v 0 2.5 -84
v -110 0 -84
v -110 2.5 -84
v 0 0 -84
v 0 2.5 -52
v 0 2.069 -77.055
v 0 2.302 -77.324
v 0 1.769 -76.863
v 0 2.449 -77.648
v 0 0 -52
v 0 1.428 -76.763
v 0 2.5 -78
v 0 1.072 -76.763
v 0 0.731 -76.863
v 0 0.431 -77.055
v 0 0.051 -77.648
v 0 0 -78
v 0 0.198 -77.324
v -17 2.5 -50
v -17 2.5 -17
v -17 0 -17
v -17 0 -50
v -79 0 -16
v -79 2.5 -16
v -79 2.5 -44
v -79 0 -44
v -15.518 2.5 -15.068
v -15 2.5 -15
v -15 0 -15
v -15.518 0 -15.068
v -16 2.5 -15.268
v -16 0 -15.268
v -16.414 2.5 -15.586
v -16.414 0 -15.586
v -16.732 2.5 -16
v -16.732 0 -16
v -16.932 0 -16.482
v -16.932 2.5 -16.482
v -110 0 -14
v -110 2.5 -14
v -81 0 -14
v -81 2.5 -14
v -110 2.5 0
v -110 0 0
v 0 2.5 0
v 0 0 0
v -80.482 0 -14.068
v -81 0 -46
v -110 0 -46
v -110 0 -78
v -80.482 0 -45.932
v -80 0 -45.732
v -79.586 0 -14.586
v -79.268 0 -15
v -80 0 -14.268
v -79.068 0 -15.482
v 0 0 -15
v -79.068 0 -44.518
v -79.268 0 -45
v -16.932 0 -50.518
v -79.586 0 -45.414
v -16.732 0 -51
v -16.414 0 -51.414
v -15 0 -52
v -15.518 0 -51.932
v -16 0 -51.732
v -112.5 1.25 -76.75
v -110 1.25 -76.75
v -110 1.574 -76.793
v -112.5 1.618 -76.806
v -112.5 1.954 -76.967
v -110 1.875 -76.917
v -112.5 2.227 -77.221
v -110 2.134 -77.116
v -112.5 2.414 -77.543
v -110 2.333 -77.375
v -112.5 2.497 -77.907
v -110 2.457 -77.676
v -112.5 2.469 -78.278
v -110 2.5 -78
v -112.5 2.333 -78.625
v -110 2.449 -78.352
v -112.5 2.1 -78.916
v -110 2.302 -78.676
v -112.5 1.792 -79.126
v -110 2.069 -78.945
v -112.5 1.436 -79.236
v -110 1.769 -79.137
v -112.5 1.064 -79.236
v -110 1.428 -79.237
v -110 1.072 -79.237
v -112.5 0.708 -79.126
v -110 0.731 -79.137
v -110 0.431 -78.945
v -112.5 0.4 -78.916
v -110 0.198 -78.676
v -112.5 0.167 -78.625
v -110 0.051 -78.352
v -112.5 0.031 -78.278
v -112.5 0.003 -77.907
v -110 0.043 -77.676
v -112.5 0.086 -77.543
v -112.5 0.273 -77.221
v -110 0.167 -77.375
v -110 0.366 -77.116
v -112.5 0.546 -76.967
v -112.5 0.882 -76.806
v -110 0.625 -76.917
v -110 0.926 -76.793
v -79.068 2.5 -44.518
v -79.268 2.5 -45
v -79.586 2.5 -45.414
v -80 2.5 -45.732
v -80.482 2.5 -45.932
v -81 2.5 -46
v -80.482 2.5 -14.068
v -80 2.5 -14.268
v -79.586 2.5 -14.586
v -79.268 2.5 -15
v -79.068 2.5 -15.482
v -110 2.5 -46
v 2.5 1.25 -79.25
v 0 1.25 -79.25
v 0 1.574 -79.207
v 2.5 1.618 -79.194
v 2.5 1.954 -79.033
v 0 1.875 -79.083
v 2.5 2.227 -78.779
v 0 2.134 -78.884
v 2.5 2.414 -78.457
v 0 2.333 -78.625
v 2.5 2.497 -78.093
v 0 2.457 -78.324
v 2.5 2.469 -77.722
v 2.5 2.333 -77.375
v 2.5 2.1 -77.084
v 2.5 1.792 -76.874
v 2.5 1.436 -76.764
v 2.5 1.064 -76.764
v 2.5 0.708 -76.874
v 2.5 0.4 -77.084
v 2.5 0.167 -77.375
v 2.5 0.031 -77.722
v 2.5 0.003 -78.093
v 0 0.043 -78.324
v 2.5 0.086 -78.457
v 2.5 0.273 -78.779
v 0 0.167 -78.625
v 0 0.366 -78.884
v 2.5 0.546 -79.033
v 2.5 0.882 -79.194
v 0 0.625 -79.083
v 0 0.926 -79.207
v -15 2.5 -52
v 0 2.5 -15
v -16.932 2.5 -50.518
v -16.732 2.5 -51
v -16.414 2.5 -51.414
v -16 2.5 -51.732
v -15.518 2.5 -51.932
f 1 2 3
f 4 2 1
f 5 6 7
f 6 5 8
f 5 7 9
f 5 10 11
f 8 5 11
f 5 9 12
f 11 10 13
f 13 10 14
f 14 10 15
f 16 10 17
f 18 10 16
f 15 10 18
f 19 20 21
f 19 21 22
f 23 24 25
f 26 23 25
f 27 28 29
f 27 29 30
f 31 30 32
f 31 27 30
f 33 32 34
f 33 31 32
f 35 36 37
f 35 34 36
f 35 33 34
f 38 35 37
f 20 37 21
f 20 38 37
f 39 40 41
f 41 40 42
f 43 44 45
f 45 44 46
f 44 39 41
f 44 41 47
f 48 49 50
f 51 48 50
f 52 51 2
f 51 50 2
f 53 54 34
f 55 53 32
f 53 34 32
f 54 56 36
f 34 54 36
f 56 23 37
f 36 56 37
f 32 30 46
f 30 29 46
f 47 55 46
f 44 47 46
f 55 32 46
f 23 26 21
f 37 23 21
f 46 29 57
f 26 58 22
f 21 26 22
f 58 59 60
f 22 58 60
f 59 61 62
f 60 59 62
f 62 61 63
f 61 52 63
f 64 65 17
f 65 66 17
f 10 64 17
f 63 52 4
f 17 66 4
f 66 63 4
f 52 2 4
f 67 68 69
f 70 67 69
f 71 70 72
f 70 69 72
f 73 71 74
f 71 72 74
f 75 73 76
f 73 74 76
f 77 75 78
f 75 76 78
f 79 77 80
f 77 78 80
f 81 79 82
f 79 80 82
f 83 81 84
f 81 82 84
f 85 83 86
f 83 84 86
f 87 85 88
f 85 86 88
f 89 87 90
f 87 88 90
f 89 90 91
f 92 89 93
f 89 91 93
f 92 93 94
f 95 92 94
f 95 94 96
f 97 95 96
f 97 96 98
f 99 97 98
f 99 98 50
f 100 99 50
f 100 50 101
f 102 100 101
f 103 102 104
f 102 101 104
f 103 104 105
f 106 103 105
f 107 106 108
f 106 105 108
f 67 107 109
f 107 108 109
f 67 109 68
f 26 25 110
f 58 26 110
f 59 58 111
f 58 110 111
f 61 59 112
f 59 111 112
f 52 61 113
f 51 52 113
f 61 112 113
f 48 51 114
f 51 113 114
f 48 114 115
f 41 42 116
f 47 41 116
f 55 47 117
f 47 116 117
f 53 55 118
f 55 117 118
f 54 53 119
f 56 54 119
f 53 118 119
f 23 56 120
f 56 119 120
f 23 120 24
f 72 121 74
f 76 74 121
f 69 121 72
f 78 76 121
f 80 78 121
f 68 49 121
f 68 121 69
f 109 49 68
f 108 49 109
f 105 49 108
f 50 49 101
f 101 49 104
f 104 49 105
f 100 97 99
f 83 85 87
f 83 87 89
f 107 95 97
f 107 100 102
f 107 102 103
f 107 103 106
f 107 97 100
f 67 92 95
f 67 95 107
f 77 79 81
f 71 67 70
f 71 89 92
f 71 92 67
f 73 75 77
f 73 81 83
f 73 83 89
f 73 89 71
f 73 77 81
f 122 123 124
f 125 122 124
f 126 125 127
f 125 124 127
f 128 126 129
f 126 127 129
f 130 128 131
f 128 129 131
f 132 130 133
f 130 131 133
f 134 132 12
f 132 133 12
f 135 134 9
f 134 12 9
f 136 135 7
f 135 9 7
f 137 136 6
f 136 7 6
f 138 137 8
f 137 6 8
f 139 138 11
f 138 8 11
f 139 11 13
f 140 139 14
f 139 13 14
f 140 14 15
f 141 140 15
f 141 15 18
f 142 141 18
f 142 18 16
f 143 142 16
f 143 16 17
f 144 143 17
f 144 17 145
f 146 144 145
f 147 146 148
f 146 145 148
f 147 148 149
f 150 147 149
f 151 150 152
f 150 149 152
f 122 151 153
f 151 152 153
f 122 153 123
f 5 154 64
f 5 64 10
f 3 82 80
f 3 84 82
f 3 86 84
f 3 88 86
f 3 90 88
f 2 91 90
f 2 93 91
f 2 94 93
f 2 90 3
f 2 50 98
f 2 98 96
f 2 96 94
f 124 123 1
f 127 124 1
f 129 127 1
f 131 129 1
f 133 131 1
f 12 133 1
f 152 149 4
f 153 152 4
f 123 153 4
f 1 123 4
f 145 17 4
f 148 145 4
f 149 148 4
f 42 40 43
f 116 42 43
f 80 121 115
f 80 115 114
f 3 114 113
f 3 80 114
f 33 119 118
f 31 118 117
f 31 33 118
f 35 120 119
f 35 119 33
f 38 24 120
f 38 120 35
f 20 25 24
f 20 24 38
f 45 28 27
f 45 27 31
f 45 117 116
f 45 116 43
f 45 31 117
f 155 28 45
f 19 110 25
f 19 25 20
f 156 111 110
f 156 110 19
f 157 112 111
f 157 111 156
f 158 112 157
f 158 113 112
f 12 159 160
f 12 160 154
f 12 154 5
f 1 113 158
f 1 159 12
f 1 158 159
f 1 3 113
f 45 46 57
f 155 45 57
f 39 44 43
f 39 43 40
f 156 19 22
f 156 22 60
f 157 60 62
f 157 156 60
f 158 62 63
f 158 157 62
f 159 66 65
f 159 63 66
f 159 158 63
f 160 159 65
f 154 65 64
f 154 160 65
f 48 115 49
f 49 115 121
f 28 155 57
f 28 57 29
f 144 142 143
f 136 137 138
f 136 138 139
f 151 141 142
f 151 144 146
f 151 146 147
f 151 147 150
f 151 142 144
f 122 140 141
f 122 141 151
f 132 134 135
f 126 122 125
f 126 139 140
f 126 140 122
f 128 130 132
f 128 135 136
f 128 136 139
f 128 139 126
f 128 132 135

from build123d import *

# Parameters (mm, degrees)
CROQUIS1_W              = 110
CROQUIS1_H              = 84
SALIENTE_EXTRUIR1_DEPTH = 2.5
CROQUIS2_R              = 1.25
SALIENTE_EXTRUIR2_DEPTH = 2.5
CROQUIS3_R              = 1.25
SALIENTE_EXTRUIR3_DEPTH = 2.5
CORTAR_EXTRUIR1_DEPTH   = 10


with BuildPart() as part:
    # Croquis1 → Saliente-Extruir1 (new body)
    with BuildSketch(Plane(origin=(0, 0, 0), x_dir=(1, 0, 0), z_dir=(0, 1, 0))):
        with Locations((-55, 42)):
            Rectangle(CROQUIS1_W, CROQUIS1_H)
    extrude(amount=SALIENTE_EXTRUIR1_DEPTH)

    # Croquis2 → Saliente-Extruir2 (add)
    with BuildSketch(Plane(origin=(0, 0, 0), x_dir=(0, 0, -1), z_dir=(1, 0, 0))):
        with Locations((78, 1.25)):
            Circle(CROQUIS2_R)
    extrude(amount=SALIENTE_EXTRUIR2_DEPTH)

    # Croquis3 → Saliente-Extruir3 (add)
    with BuildSketch(Plane.ZY.offset(110)):
        with Locations((-78, 1.25)):
            Circle(CROQUIS3_R)
    extrude(amount=SALIENTE_EXTRUIR3_DEPTH)

    # Croquis4 → Cortar-Extruir1 (cut)
    with BuildSketch(Plane(origin=(0, 2.5, 0), x_dir=(1, 0, 0), z_dir=(0, 1, 0))):
        with BuildLine():
            Line((-81, 46), (-110, 46))
            Line((-110, 46), (-110, 14))
            Line((-110, 14), (-81, 14))
            ThreePointArc((-81, 14), (-79.585786438, 14.585786438), (-79, 16))
            Line((-79, 16), (-79, 44))
            ThreePointArc((-79, 44), (-79.585786438, 45.414213562), (-81, 46))
        make_face()
        with BuildLine():
            Line((-17, 17), (-17, 50))
            ThreePointArc((-17, 50), (-16.414213562, 51.414213562), (-15, 52))
            Line((-15, 52), (0, 52))
            Line((0, 52), (0, 15))
            Line((0, 15), (-15, 15))
            ThreePointArc((-15, 15), (-16.414213562, 15.585786438), (-17, 17))
        make_face()
    extrude(amount=-CORTAR_EXTRUIR1_DEPTH, mode=Mode.SUBTRACT)


solid = part.part
